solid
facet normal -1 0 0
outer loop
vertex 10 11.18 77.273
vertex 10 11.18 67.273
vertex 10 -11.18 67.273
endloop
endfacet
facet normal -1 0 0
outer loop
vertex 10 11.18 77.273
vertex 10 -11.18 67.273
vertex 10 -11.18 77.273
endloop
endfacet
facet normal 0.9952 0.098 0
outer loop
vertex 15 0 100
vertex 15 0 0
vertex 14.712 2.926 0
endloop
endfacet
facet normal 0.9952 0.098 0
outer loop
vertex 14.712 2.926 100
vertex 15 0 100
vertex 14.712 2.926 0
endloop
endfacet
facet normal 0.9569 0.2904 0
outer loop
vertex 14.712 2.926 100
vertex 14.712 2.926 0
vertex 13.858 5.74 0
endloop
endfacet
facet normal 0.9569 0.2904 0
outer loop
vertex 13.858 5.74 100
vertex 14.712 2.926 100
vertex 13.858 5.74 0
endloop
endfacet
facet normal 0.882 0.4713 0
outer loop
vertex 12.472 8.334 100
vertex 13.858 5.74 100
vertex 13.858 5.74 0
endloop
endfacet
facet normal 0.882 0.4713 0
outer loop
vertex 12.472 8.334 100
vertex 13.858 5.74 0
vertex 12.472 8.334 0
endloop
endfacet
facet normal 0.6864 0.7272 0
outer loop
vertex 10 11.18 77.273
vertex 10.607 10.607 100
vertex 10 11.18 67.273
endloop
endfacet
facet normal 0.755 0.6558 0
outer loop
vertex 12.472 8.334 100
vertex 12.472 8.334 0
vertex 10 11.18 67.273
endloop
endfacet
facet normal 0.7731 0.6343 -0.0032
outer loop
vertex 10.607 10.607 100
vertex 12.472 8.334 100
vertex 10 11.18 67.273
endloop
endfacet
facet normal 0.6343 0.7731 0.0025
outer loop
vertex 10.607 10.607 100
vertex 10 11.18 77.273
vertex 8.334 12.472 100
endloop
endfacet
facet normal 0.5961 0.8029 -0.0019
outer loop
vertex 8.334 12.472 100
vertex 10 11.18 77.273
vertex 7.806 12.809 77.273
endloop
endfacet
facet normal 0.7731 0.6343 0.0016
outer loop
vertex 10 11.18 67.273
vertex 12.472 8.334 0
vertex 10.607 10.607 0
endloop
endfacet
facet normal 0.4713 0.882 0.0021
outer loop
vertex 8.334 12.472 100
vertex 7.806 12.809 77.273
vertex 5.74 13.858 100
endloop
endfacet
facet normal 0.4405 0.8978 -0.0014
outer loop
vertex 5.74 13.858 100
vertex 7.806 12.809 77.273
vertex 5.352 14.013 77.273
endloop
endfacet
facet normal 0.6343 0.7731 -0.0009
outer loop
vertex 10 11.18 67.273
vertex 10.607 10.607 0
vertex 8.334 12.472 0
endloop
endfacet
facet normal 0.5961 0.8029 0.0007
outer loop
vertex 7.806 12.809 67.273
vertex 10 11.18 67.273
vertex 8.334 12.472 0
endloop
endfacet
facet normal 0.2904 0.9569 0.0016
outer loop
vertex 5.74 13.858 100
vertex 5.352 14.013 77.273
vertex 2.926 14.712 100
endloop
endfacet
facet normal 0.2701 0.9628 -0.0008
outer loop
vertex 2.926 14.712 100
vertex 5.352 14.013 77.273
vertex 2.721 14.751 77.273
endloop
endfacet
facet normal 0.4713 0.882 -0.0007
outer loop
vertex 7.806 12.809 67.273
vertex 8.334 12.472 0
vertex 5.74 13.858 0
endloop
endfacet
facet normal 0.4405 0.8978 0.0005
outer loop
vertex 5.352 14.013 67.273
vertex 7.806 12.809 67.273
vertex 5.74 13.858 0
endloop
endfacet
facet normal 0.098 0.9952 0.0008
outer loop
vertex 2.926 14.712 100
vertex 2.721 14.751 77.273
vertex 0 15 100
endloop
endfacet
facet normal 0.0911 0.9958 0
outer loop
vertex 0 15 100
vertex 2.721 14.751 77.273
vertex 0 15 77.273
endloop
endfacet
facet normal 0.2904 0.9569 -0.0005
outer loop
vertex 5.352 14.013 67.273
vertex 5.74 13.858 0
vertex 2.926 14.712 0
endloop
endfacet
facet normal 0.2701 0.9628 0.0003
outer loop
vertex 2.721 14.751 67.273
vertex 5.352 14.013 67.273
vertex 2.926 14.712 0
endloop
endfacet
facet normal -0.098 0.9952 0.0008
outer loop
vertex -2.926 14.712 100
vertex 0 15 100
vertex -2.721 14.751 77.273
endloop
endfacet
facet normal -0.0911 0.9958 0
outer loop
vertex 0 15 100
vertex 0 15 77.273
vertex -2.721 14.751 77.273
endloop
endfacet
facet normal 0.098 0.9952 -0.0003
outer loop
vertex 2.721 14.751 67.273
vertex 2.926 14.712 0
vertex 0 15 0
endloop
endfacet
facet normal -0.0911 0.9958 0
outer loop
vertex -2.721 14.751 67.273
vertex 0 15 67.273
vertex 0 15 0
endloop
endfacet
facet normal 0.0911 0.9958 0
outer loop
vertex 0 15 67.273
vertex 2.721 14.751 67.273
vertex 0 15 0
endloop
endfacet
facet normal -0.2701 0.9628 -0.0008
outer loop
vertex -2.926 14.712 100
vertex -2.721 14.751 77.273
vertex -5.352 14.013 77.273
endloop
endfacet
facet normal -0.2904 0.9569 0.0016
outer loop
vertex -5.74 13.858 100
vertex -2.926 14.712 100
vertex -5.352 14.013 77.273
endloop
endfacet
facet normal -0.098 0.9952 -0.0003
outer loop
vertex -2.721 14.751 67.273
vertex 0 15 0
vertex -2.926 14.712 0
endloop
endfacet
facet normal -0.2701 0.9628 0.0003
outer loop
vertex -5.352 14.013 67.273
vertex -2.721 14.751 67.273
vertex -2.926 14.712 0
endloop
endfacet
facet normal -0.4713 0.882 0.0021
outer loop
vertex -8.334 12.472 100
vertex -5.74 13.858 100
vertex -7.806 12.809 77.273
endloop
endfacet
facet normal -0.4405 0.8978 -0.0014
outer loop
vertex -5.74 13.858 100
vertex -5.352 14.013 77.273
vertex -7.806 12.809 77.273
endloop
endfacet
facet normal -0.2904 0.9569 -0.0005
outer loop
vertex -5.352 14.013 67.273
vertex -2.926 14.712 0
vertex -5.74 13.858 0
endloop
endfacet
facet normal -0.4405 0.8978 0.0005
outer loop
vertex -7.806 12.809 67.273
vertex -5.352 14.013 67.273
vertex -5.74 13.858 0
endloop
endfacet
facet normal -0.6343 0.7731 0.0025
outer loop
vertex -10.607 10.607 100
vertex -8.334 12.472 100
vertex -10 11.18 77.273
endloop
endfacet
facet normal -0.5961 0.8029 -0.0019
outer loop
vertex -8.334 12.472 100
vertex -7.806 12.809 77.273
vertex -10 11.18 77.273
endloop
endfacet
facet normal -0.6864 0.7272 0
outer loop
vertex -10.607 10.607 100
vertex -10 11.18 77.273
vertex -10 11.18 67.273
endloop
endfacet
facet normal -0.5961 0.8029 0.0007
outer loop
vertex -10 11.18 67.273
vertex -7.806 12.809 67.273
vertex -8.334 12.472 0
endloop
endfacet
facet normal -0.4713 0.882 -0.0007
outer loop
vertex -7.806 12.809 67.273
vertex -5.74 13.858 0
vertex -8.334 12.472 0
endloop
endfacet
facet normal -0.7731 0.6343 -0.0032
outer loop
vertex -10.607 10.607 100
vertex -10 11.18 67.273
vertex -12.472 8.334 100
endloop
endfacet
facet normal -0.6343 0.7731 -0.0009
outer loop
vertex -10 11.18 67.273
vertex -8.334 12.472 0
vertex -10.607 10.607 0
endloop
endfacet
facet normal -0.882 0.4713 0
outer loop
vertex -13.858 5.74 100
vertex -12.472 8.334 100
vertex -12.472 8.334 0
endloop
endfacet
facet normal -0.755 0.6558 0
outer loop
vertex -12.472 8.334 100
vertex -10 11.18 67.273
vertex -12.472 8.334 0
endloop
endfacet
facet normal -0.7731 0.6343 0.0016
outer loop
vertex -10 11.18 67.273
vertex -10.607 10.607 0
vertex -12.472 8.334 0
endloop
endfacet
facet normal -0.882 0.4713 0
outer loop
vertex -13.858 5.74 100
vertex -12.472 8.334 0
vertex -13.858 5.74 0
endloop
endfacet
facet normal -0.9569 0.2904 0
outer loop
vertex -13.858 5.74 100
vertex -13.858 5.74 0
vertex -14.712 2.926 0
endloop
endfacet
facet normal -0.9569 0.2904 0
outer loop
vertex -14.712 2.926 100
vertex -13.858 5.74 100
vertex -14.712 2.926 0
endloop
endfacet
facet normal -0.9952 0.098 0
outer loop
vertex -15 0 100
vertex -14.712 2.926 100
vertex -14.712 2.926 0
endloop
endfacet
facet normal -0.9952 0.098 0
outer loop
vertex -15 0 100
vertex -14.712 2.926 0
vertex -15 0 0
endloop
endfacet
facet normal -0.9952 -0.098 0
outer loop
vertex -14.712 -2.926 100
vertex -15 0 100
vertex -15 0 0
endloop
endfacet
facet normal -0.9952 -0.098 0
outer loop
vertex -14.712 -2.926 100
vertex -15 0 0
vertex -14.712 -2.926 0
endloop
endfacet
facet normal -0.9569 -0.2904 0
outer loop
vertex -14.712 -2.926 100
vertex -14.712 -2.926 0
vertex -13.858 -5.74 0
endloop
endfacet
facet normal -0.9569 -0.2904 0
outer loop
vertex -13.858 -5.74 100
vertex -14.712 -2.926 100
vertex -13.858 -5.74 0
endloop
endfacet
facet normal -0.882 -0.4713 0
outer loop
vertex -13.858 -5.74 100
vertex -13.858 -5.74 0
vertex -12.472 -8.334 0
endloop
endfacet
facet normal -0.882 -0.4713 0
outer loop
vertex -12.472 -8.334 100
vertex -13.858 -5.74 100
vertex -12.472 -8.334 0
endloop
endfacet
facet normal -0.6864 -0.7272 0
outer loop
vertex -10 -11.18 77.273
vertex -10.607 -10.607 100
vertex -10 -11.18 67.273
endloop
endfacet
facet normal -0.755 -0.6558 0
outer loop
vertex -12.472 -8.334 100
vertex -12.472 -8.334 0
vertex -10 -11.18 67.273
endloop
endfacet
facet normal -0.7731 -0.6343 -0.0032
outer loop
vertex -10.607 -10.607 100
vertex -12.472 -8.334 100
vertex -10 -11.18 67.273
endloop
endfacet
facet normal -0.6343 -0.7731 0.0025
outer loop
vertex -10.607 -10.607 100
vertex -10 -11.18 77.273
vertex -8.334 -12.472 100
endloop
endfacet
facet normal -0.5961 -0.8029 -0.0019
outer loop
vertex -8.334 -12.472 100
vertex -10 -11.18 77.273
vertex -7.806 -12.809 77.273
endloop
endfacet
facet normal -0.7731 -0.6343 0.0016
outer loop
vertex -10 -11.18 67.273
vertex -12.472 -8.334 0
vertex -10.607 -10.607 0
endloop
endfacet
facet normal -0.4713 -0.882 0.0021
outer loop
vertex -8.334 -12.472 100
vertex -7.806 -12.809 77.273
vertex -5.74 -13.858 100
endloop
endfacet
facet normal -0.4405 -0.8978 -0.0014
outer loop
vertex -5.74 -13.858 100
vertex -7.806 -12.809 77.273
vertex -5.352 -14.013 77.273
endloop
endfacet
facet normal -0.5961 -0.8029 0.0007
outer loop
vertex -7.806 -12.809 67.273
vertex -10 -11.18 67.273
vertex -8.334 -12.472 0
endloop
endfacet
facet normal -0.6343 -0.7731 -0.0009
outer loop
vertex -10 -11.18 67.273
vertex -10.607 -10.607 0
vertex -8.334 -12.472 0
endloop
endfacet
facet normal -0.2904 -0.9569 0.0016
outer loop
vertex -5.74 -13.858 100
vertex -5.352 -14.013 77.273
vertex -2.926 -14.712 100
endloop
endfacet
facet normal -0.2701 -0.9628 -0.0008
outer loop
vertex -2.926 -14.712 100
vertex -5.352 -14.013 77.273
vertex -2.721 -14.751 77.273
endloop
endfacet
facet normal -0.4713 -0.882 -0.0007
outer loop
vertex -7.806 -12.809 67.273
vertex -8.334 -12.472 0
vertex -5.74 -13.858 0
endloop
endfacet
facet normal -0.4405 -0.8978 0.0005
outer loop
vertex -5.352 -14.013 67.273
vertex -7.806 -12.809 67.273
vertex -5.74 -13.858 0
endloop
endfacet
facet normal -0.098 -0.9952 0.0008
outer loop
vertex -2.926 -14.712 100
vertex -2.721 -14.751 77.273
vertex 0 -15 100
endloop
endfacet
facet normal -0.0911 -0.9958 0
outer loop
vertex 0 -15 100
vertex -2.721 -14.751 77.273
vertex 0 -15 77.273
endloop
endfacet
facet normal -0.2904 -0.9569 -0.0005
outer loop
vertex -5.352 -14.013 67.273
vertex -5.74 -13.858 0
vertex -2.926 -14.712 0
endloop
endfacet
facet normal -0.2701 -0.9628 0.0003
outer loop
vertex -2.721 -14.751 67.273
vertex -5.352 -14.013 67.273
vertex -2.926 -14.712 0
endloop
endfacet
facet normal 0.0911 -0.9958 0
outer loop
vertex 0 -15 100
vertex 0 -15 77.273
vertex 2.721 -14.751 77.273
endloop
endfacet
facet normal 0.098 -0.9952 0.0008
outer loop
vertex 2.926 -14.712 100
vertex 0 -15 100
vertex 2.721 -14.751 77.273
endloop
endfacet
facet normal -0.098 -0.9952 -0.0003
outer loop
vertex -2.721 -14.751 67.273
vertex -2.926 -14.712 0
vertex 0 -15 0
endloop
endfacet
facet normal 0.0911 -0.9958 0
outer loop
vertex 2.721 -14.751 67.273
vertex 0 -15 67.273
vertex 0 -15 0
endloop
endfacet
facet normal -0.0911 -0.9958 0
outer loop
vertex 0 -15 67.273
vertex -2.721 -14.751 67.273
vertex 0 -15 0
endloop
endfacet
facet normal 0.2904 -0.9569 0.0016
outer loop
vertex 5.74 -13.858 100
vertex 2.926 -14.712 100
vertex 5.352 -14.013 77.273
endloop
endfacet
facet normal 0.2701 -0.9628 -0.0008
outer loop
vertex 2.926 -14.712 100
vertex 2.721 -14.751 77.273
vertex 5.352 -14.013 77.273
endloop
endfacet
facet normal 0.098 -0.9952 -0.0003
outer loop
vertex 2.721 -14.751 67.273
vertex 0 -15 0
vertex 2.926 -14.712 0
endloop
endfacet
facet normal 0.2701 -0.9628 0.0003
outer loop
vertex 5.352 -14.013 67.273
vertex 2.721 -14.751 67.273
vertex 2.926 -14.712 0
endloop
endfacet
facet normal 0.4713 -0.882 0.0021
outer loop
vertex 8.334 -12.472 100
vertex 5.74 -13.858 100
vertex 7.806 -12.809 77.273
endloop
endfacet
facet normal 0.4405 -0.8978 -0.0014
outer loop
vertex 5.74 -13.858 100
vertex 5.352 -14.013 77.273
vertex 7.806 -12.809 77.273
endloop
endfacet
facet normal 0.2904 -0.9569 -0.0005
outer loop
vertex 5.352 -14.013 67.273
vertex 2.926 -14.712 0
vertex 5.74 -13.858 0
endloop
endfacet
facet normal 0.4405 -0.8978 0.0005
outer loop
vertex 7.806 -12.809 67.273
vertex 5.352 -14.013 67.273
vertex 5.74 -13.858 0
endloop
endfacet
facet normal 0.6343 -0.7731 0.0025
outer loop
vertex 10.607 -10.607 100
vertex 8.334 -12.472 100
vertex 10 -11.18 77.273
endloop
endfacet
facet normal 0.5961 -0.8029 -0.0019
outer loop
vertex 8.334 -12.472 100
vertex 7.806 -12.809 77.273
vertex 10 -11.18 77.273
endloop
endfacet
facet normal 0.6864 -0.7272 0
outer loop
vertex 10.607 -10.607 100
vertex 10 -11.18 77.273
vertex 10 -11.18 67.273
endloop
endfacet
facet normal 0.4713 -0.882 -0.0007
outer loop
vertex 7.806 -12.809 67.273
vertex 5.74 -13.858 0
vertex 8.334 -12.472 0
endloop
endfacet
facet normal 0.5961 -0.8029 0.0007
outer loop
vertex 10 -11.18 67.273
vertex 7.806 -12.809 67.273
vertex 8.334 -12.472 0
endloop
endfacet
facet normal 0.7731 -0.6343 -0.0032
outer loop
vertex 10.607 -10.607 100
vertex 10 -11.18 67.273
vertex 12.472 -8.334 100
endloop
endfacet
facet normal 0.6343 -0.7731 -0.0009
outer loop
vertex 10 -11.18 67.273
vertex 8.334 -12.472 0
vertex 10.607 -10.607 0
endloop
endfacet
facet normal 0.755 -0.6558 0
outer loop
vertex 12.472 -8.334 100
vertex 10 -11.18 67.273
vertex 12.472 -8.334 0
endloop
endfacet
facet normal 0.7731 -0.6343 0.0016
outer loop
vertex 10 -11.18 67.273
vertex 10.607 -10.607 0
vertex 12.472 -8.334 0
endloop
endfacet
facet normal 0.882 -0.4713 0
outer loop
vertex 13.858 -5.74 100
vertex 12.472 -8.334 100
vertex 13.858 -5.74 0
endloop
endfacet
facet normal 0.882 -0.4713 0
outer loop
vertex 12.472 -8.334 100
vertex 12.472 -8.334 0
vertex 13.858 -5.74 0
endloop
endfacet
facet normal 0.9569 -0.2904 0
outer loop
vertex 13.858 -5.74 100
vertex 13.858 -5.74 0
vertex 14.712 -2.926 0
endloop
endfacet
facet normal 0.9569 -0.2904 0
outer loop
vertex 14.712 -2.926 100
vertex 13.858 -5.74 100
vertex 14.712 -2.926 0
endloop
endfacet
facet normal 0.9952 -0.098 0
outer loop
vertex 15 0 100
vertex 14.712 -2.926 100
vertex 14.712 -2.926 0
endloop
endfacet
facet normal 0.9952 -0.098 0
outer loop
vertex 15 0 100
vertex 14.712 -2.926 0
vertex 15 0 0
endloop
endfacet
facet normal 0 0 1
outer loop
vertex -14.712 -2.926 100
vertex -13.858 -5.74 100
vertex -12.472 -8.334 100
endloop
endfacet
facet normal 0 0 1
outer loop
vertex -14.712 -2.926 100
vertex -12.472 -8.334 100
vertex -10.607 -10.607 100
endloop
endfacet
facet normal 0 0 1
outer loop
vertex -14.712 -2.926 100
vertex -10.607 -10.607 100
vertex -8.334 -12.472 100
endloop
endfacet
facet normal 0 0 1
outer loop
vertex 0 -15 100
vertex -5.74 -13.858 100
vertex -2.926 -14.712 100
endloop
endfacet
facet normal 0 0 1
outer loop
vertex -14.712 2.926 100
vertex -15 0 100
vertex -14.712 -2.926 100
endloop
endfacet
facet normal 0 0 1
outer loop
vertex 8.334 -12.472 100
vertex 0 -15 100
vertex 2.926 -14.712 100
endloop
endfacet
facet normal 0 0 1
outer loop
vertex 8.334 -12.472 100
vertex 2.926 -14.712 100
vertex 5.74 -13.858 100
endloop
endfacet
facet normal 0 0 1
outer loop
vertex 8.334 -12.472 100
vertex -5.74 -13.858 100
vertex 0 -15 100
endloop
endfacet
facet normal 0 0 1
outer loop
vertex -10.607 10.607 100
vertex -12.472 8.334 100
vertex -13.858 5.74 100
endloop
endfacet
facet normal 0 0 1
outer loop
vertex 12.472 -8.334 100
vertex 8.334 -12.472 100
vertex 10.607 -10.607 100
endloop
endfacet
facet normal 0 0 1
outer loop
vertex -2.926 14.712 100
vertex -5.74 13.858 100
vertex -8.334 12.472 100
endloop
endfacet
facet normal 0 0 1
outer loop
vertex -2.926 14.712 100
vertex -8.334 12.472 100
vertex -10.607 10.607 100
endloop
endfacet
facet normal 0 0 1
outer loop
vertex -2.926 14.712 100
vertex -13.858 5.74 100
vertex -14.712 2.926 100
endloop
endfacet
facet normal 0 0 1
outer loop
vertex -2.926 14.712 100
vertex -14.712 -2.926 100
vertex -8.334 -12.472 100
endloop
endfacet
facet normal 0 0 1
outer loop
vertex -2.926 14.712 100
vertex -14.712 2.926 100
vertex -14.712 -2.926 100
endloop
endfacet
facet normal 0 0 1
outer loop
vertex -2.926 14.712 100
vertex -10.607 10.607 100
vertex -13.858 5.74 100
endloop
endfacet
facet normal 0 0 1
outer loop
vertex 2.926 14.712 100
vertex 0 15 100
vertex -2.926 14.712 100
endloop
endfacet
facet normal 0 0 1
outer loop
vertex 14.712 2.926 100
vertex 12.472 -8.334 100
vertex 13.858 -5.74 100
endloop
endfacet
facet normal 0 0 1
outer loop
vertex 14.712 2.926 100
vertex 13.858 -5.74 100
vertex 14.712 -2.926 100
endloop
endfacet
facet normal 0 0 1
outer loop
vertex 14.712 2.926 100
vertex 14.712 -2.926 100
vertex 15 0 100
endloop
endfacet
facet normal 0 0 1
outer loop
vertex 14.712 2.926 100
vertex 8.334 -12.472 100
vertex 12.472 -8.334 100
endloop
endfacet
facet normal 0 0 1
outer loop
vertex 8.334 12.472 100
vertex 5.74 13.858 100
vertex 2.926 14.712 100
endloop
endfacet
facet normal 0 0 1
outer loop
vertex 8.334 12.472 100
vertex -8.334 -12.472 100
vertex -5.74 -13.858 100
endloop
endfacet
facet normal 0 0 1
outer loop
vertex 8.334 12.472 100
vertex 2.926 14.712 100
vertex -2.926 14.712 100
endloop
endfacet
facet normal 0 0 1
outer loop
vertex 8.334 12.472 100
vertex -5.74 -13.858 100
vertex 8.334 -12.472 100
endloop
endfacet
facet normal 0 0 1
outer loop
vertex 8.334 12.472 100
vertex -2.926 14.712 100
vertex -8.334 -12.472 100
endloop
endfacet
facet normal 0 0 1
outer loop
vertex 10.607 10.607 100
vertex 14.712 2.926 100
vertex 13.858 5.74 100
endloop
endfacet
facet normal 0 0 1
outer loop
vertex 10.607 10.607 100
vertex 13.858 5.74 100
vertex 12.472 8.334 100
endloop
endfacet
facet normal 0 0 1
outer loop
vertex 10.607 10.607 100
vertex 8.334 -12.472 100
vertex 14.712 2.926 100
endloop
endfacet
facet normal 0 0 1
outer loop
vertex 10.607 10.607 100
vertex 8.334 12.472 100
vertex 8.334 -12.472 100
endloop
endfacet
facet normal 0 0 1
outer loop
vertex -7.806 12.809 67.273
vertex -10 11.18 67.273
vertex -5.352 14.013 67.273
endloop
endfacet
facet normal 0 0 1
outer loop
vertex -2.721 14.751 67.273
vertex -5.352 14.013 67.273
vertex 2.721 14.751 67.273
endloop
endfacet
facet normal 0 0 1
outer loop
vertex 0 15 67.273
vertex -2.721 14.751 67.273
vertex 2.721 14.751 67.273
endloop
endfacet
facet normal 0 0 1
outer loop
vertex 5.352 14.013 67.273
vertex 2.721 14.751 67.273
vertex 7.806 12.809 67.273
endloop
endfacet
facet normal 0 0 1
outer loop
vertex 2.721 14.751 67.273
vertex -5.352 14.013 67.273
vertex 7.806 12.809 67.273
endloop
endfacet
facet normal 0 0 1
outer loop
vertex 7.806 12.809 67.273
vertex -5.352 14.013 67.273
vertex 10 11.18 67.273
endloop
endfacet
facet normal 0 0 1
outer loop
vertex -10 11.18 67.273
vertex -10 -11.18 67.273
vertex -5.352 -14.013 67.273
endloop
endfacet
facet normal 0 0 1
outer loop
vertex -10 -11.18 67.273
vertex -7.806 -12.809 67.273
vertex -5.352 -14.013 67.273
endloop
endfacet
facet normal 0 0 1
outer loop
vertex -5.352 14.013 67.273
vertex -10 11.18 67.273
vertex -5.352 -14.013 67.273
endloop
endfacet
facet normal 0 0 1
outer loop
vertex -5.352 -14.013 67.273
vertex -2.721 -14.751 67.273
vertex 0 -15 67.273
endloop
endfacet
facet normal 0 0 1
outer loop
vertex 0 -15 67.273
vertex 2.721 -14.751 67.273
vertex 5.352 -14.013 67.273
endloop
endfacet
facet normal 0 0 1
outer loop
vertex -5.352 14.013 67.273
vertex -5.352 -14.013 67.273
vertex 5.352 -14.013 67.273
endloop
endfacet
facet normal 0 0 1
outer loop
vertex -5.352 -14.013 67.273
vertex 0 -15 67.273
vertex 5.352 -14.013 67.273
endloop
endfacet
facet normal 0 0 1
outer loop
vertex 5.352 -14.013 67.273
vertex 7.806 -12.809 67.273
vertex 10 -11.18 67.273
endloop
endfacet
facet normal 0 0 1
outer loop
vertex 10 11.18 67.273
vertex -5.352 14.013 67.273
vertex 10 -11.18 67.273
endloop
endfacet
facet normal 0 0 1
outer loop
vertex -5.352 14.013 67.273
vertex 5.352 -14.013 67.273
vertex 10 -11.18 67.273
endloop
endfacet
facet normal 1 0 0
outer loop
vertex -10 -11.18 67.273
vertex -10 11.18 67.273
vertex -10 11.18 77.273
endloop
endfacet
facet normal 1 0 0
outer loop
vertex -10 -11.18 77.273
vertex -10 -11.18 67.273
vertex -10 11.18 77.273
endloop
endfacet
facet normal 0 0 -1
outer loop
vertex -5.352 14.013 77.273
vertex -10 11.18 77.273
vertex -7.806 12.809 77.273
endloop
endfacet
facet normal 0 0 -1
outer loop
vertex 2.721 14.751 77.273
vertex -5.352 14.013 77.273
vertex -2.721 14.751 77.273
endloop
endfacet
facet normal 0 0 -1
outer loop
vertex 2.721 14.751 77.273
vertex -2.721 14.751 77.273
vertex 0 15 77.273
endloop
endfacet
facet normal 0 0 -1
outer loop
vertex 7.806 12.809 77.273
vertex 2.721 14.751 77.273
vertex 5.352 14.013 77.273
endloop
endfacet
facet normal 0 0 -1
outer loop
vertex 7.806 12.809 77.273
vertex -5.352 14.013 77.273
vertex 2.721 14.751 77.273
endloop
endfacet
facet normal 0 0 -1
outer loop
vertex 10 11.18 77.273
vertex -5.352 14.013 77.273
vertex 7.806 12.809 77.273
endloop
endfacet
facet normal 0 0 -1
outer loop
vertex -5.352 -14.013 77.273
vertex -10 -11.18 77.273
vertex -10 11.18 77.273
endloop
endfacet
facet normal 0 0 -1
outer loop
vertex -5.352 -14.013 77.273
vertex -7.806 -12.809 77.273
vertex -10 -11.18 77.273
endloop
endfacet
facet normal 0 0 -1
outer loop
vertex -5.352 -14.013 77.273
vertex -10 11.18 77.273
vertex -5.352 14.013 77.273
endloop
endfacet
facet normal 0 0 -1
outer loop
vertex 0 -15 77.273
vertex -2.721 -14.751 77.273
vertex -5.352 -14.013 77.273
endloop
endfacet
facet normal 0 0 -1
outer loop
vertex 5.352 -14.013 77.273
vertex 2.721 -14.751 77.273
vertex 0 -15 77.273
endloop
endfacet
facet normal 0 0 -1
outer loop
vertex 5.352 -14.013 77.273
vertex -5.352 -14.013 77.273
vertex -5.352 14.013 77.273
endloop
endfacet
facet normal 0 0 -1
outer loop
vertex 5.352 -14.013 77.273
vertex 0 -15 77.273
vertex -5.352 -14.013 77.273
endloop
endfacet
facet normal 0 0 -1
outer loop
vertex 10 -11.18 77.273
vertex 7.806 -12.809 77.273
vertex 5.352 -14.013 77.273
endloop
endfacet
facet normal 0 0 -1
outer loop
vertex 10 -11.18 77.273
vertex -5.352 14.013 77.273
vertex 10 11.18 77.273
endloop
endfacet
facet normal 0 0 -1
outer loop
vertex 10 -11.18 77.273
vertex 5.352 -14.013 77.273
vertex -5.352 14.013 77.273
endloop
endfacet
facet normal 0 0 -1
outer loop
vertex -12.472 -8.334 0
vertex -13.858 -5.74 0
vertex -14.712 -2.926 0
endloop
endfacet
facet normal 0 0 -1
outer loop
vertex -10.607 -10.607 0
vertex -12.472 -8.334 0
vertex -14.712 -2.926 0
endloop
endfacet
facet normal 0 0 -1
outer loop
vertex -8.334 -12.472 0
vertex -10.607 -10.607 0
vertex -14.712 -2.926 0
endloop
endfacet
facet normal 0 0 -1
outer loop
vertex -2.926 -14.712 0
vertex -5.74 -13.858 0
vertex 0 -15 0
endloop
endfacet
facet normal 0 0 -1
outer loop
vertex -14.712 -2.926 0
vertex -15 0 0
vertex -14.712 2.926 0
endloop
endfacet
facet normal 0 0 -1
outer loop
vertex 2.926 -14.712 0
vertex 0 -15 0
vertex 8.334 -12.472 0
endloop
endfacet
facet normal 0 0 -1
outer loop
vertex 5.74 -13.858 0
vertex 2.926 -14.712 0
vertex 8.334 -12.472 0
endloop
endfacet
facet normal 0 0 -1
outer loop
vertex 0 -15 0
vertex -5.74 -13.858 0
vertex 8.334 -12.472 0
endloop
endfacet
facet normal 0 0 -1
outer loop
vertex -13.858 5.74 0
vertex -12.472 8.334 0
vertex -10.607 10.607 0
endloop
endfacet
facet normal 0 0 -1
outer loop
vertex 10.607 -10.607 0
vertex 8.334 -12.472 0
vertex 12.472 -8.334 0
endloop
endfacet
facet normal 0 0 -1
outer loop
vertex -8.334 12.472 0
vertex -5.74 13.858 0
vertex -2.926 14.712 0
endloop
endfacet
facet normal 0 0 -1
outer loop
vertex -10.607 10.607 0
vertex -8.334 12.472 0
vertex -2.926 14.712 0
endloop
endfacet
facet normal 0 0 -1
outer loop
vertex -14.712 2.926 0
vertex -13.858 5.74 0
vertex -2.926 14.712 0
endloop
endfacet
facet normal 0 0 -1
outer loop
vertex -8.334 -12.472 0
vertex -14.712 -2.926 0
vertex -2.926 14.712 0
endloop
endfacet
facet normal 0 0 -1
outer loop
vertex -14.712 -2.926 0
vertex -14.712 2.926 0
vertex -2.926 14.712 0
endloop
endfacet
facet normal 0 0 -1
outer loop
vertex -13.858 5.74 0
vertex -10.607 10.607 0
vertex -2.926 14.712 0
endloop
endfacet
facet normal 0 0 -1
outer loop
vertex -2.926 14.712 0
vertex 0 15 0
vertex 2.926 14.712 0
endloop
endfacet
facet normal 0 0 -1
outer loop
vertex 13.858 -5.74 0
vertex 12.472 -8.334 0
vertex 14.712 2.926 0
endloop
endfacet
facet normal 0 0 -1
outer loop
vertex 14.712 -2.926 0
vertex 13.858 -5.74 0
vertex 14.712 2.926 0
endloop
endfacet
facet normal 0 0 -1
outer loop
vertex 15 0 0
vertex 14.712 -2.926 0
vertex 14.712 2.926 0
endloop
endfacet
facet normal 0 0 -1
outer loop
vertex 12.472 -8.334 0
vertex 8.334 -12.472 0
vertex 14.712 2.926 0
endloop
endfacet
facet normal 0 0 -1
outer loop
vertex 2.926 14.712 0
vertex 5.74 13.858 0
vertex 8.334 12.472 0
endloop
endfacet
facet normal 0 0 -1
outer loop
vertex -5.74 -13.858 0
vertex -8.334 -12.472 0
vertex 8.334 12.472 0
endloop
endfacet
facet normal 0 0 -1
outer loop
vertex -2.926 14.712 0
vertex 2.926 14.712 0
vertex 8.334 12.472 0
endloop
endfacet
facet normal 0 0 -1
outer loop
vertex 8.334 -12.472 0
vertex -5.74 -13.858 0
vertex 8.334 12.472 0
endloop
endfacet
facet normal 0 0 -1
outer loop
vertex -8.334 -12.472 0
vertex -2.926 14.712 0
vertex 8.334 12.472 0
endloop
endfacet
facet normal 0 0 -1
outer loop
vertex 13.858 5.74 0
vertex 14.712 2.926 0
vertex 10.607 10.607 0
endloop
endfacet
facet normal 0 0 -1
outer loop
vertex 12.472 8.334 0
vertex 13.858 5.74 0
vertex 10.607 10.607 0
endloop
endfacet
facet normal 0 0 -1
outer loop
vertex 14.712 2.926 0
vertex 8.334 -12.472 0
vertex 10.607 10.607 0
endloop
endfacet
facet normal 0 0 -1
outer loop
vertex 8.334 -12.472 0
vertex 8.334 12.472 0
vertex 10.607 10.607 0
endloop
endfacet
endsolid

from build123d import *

# Parameters (mm, degrees)
F0_R     = 15
F1_DEPTH = 100
F2_W     = 20
F2_H     = 10
F3_DEPTH = 75


with BuildPart() as f1:
    # F0 (on Top) → F1 (new body)
    with BuildSketch(Plane.XY):
        Circle(F0_R)
    extrude(amount=F1_DEPTH)

    # F2 (on Front) → F3 (cut, symmetric)
    with BuildSketch(Plane.XZ):
        with Locations((0, 72.273272)):
            Rectangle(F2_W, F2_H)
    extrude(amount=F3_DEPTH, both=True, mode=Mode.SUBTRACT)


solid = f1.part
